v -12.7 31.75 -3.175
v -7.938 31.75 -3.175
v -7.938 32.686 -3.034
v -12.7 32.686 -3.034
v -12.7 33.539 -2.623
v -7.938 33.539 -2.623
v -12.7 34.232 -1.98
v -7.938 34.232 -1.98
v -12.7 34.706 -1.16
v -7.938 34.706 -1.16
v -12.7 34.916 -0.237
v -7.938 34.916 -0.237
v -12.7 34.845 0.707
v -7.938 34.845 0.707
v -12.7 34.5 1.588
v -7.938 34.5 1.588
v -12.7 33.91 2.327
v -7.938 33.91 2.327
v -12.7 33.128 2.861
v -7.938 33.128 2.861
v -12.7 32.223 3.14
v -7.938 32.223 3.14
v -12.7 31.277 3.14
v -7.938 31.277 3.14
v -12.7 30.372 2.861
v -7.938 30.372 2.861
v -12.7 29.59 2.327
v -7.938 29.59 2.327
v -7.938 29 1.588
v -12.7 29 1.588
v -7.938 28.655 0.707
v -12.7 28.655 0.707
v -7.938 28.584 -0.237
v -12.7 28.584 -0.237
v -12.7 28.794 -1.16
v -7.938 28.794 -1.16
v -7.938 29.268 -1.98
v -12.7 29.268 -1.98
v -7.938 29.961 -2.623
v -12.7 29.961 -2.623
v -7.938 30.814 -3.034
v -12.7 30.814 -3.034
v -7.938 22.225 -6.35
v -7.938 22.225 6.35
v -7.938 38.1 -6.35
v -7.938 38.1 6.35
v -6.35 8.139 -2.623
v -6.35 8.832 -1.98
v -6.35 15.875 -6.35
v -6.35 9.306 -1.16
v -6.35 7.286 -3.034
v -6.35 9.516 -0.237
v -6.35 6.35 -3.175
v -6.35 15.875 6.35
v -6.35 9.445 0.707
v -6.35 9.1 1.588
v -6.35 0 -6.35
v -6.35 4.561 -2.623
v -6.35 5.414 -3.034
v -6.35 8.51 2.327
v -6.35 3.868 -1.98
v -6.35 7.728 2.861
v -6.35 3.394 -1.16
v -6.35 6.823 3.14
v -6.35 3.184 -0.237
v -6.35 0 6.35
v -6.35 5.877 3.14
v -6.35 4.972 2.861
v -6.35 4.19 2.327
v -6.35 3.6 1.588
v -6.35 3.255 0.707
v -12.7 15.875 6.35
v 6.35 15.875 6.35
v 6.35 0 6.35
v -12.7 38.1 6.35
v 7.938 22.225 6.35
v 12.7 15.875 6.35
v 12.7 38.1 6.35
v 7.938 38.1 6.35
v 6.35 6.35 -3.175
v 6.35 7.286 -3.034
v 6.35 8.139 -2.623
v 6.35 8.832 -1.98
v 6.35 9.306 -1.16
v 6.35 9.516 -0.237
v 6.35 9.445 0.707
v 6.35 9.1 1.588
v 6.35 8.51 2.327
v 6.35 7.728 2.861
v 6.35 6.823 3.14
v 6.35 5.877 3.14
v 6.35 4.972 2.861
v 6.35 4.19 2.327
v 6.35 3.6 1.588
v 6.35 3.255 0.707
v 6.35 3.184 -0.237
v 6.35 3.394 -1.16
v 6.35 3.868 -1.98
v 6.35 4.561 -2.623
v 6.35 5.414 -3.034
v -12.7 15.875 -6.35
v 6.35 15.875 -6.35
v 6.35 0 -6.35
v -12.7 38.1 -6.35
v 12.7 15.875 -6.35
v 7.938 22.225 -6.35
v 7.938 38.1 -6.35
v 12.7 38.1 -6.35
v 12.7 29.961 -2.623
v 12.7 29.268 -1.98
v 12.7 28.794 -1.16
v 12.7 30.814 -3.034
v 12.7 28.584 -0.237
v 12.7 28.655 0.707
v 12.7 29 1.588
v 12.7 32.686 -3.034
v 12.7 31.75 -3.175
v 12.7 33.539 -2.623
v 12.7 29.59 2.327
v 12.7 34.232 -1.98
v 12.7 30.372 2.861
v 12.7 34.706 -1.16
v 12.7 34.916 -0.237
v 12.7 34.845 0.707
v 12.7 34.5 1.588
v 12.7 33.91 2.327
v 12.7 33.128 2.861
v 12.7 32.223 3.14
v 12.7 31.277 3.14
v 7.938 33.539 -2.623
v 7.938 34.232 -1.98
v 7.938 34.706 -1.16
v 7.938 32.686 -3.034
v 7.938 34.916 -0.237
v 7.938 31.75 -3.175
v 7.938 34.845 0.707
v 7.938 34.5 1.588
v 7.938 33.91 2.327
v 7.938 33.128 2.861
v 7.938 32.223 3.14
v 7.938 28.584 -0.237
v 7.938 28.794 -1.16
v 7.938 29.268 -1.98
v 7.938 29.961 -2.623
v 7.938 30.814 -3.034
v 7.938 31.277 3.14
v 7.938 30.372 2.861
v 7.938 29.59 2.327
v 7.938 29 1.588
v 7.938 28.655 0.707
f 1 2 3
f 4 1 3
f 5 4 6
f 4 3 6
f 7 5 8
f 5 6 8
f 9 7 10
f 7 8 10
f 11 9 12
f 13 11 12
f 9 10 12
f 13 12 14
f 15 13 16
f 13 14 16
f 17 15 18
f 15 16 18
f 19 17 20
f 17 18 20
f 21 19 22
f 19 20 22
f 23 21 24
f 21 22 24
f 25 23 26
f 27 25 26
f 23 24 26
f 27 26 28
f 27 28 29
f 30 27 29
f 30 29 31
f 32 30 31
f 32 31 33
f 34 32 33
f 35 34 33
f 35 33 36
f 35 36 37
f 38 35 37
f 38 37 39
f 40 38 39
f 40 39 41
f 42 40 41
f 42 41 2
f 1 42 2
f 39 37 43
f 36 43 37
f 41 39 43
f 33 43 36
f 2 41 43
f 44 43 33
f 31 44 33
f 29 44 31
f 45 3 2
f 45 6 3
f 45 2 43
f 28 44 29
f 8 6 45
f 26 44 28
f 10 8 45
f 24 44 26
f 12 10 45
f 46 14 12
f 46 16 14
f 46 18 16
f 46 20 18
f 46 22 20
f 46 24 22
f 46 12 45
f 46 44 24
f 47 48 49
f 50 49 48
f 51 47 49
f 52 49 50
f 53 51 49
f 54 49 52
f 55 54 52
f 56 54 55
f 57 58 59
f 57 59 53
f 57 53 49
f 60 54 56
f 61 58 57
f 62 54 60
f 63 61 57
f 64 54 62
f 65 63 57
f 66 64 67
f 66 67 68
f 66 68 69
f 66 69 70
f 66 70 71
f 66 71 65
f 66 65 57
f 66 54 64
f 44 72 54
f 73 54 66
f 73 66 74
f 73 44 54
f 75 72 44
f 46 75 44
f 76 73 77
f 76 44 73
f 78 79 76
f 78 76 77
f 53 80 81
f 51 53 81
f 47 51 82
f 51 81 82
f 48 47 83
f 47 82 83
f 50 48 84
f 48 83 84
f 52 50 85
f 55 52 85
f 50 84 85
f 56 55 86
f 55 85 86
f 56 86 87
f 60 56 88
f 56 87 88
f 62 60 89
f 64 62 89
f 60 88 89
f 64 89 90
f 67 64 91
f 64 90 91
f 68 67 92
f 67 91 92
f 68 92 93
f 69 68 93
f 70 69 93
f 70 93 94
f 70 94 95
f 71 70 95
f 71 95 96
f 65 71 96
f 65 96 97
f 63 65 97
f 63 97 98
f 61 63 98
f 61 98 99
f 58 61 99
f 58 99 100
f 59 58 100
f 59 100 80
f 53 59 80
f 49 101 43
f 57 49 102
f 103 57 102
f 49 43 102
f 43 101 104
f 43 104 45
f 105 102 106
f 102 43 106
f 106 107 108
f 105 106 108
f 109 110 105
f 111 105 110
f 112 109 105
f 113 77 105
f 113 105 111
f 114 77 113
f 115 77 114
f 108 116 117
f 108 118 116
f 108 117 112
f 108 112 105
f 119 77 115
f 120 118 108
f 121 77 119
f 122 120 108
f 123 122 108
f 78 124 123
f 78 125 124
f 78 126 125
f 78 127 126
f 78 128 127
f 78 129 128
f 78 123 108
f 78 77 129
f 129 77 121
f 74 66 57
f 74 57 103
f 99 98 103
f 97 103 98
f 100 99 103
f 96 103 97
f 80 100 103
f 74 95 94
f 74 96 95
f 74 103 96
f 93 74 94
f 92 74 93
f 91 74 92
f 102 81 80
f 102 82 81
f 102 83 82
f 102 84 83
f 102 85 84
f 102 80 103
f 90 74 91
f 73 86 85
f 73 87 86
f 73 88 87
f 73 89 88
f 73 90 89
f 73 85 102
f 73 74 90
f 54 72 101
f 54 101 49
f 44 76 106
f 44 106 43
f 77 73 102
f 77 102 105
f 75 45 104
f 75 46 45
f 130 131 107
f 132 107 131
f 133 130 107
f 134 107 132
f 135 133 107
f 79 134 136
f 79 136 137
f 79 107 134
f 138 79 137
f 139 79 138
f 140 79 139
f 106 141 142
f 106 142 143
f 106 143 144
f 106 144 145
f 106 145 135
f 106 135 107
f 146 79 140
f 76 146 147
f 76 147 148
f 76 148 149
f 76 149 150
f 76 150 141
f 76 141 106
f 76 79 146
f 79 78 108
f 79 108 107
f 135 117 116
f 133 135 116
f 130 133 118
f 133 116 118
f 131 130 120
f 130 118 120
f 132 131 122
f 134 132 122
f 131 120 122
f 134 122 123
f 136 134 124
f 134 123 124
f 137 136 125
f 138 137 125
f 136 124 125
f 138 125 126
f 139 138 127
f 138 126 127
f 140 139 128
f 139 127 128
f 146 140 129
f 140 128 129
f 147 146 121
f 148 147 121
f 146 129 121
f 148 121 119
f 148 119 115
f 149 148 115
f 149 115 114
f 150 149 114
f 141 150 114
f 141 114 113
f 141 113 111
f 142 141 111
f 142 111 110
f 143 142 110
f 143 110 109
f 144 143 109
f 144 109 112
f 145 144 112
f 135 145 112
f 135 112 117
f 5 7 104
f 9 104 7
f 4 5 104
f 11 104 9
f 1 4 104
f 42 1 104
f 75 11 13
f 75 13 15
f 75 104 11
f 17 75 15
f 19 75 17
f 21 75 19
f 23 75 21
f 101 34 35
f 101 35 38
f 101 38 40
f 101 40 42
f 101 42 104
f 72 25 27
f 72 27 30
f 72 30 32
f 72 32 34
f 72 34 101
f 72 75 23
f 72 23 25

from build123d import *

# Parameters (mm, degrees)
BOSS_EXTRUDE1_DEPTH = 6.35
SKETCH2_R           = 3.175
CUT_EXTRUDE1_DEPTH  = 26.4
SKETCH3_R           = 3.175
CUT_EXTRUDE2_DEPTH  = 20.05


with BuildPart() as part:
    # Sketch1 → Boss-Extrude1 (new body, symmetric)
    with BuildSketch(Plane.XY):
        Polygon((-12.7, 38.1), (-12.7, 15.875), (-6.35, 15.875), (-6.35, 0), (6.35, 0), (6.35, 15.875), (12.7, 15.875), (12.7, 38.1), (7.9375, 38.1), (7.9375, 22.225), (-7.9375, 22.225), (-7.9375, 38.1), align=None)
    extrude(amount=BOSS_EXTRUDE1_DEPTH, both=True)

    # Sketch2 → Cut-Extrude1 (cut, through all)
    with BuildSketch(Plane(origin=(12.7, 0, 0), x_dir=(0, 0, -1), z_dir=(1, 0, 0))):
        with Locations((0, 31.75)):
            Circle(SKETCH2_R)
    extrude(amount=-CUT_EXTRUDE1_DEPTH, mode=Mode.SUBTRACT)

    # Sketch3 → Cut-Extrude2 (cut, through all)
    with BuildSketch(Plane(origin=(6.35, 0, 0), x_dir=(0, 0, -1), z_dir=(1, 0, 0))):
        with Locations((0, 6.35)):
            Circle(SKETCH3_R)
    extrude(amount=-CUT_EXTRUDE2_DEPTH, mode=Mode.SUBTRACT)


solid = part.part
